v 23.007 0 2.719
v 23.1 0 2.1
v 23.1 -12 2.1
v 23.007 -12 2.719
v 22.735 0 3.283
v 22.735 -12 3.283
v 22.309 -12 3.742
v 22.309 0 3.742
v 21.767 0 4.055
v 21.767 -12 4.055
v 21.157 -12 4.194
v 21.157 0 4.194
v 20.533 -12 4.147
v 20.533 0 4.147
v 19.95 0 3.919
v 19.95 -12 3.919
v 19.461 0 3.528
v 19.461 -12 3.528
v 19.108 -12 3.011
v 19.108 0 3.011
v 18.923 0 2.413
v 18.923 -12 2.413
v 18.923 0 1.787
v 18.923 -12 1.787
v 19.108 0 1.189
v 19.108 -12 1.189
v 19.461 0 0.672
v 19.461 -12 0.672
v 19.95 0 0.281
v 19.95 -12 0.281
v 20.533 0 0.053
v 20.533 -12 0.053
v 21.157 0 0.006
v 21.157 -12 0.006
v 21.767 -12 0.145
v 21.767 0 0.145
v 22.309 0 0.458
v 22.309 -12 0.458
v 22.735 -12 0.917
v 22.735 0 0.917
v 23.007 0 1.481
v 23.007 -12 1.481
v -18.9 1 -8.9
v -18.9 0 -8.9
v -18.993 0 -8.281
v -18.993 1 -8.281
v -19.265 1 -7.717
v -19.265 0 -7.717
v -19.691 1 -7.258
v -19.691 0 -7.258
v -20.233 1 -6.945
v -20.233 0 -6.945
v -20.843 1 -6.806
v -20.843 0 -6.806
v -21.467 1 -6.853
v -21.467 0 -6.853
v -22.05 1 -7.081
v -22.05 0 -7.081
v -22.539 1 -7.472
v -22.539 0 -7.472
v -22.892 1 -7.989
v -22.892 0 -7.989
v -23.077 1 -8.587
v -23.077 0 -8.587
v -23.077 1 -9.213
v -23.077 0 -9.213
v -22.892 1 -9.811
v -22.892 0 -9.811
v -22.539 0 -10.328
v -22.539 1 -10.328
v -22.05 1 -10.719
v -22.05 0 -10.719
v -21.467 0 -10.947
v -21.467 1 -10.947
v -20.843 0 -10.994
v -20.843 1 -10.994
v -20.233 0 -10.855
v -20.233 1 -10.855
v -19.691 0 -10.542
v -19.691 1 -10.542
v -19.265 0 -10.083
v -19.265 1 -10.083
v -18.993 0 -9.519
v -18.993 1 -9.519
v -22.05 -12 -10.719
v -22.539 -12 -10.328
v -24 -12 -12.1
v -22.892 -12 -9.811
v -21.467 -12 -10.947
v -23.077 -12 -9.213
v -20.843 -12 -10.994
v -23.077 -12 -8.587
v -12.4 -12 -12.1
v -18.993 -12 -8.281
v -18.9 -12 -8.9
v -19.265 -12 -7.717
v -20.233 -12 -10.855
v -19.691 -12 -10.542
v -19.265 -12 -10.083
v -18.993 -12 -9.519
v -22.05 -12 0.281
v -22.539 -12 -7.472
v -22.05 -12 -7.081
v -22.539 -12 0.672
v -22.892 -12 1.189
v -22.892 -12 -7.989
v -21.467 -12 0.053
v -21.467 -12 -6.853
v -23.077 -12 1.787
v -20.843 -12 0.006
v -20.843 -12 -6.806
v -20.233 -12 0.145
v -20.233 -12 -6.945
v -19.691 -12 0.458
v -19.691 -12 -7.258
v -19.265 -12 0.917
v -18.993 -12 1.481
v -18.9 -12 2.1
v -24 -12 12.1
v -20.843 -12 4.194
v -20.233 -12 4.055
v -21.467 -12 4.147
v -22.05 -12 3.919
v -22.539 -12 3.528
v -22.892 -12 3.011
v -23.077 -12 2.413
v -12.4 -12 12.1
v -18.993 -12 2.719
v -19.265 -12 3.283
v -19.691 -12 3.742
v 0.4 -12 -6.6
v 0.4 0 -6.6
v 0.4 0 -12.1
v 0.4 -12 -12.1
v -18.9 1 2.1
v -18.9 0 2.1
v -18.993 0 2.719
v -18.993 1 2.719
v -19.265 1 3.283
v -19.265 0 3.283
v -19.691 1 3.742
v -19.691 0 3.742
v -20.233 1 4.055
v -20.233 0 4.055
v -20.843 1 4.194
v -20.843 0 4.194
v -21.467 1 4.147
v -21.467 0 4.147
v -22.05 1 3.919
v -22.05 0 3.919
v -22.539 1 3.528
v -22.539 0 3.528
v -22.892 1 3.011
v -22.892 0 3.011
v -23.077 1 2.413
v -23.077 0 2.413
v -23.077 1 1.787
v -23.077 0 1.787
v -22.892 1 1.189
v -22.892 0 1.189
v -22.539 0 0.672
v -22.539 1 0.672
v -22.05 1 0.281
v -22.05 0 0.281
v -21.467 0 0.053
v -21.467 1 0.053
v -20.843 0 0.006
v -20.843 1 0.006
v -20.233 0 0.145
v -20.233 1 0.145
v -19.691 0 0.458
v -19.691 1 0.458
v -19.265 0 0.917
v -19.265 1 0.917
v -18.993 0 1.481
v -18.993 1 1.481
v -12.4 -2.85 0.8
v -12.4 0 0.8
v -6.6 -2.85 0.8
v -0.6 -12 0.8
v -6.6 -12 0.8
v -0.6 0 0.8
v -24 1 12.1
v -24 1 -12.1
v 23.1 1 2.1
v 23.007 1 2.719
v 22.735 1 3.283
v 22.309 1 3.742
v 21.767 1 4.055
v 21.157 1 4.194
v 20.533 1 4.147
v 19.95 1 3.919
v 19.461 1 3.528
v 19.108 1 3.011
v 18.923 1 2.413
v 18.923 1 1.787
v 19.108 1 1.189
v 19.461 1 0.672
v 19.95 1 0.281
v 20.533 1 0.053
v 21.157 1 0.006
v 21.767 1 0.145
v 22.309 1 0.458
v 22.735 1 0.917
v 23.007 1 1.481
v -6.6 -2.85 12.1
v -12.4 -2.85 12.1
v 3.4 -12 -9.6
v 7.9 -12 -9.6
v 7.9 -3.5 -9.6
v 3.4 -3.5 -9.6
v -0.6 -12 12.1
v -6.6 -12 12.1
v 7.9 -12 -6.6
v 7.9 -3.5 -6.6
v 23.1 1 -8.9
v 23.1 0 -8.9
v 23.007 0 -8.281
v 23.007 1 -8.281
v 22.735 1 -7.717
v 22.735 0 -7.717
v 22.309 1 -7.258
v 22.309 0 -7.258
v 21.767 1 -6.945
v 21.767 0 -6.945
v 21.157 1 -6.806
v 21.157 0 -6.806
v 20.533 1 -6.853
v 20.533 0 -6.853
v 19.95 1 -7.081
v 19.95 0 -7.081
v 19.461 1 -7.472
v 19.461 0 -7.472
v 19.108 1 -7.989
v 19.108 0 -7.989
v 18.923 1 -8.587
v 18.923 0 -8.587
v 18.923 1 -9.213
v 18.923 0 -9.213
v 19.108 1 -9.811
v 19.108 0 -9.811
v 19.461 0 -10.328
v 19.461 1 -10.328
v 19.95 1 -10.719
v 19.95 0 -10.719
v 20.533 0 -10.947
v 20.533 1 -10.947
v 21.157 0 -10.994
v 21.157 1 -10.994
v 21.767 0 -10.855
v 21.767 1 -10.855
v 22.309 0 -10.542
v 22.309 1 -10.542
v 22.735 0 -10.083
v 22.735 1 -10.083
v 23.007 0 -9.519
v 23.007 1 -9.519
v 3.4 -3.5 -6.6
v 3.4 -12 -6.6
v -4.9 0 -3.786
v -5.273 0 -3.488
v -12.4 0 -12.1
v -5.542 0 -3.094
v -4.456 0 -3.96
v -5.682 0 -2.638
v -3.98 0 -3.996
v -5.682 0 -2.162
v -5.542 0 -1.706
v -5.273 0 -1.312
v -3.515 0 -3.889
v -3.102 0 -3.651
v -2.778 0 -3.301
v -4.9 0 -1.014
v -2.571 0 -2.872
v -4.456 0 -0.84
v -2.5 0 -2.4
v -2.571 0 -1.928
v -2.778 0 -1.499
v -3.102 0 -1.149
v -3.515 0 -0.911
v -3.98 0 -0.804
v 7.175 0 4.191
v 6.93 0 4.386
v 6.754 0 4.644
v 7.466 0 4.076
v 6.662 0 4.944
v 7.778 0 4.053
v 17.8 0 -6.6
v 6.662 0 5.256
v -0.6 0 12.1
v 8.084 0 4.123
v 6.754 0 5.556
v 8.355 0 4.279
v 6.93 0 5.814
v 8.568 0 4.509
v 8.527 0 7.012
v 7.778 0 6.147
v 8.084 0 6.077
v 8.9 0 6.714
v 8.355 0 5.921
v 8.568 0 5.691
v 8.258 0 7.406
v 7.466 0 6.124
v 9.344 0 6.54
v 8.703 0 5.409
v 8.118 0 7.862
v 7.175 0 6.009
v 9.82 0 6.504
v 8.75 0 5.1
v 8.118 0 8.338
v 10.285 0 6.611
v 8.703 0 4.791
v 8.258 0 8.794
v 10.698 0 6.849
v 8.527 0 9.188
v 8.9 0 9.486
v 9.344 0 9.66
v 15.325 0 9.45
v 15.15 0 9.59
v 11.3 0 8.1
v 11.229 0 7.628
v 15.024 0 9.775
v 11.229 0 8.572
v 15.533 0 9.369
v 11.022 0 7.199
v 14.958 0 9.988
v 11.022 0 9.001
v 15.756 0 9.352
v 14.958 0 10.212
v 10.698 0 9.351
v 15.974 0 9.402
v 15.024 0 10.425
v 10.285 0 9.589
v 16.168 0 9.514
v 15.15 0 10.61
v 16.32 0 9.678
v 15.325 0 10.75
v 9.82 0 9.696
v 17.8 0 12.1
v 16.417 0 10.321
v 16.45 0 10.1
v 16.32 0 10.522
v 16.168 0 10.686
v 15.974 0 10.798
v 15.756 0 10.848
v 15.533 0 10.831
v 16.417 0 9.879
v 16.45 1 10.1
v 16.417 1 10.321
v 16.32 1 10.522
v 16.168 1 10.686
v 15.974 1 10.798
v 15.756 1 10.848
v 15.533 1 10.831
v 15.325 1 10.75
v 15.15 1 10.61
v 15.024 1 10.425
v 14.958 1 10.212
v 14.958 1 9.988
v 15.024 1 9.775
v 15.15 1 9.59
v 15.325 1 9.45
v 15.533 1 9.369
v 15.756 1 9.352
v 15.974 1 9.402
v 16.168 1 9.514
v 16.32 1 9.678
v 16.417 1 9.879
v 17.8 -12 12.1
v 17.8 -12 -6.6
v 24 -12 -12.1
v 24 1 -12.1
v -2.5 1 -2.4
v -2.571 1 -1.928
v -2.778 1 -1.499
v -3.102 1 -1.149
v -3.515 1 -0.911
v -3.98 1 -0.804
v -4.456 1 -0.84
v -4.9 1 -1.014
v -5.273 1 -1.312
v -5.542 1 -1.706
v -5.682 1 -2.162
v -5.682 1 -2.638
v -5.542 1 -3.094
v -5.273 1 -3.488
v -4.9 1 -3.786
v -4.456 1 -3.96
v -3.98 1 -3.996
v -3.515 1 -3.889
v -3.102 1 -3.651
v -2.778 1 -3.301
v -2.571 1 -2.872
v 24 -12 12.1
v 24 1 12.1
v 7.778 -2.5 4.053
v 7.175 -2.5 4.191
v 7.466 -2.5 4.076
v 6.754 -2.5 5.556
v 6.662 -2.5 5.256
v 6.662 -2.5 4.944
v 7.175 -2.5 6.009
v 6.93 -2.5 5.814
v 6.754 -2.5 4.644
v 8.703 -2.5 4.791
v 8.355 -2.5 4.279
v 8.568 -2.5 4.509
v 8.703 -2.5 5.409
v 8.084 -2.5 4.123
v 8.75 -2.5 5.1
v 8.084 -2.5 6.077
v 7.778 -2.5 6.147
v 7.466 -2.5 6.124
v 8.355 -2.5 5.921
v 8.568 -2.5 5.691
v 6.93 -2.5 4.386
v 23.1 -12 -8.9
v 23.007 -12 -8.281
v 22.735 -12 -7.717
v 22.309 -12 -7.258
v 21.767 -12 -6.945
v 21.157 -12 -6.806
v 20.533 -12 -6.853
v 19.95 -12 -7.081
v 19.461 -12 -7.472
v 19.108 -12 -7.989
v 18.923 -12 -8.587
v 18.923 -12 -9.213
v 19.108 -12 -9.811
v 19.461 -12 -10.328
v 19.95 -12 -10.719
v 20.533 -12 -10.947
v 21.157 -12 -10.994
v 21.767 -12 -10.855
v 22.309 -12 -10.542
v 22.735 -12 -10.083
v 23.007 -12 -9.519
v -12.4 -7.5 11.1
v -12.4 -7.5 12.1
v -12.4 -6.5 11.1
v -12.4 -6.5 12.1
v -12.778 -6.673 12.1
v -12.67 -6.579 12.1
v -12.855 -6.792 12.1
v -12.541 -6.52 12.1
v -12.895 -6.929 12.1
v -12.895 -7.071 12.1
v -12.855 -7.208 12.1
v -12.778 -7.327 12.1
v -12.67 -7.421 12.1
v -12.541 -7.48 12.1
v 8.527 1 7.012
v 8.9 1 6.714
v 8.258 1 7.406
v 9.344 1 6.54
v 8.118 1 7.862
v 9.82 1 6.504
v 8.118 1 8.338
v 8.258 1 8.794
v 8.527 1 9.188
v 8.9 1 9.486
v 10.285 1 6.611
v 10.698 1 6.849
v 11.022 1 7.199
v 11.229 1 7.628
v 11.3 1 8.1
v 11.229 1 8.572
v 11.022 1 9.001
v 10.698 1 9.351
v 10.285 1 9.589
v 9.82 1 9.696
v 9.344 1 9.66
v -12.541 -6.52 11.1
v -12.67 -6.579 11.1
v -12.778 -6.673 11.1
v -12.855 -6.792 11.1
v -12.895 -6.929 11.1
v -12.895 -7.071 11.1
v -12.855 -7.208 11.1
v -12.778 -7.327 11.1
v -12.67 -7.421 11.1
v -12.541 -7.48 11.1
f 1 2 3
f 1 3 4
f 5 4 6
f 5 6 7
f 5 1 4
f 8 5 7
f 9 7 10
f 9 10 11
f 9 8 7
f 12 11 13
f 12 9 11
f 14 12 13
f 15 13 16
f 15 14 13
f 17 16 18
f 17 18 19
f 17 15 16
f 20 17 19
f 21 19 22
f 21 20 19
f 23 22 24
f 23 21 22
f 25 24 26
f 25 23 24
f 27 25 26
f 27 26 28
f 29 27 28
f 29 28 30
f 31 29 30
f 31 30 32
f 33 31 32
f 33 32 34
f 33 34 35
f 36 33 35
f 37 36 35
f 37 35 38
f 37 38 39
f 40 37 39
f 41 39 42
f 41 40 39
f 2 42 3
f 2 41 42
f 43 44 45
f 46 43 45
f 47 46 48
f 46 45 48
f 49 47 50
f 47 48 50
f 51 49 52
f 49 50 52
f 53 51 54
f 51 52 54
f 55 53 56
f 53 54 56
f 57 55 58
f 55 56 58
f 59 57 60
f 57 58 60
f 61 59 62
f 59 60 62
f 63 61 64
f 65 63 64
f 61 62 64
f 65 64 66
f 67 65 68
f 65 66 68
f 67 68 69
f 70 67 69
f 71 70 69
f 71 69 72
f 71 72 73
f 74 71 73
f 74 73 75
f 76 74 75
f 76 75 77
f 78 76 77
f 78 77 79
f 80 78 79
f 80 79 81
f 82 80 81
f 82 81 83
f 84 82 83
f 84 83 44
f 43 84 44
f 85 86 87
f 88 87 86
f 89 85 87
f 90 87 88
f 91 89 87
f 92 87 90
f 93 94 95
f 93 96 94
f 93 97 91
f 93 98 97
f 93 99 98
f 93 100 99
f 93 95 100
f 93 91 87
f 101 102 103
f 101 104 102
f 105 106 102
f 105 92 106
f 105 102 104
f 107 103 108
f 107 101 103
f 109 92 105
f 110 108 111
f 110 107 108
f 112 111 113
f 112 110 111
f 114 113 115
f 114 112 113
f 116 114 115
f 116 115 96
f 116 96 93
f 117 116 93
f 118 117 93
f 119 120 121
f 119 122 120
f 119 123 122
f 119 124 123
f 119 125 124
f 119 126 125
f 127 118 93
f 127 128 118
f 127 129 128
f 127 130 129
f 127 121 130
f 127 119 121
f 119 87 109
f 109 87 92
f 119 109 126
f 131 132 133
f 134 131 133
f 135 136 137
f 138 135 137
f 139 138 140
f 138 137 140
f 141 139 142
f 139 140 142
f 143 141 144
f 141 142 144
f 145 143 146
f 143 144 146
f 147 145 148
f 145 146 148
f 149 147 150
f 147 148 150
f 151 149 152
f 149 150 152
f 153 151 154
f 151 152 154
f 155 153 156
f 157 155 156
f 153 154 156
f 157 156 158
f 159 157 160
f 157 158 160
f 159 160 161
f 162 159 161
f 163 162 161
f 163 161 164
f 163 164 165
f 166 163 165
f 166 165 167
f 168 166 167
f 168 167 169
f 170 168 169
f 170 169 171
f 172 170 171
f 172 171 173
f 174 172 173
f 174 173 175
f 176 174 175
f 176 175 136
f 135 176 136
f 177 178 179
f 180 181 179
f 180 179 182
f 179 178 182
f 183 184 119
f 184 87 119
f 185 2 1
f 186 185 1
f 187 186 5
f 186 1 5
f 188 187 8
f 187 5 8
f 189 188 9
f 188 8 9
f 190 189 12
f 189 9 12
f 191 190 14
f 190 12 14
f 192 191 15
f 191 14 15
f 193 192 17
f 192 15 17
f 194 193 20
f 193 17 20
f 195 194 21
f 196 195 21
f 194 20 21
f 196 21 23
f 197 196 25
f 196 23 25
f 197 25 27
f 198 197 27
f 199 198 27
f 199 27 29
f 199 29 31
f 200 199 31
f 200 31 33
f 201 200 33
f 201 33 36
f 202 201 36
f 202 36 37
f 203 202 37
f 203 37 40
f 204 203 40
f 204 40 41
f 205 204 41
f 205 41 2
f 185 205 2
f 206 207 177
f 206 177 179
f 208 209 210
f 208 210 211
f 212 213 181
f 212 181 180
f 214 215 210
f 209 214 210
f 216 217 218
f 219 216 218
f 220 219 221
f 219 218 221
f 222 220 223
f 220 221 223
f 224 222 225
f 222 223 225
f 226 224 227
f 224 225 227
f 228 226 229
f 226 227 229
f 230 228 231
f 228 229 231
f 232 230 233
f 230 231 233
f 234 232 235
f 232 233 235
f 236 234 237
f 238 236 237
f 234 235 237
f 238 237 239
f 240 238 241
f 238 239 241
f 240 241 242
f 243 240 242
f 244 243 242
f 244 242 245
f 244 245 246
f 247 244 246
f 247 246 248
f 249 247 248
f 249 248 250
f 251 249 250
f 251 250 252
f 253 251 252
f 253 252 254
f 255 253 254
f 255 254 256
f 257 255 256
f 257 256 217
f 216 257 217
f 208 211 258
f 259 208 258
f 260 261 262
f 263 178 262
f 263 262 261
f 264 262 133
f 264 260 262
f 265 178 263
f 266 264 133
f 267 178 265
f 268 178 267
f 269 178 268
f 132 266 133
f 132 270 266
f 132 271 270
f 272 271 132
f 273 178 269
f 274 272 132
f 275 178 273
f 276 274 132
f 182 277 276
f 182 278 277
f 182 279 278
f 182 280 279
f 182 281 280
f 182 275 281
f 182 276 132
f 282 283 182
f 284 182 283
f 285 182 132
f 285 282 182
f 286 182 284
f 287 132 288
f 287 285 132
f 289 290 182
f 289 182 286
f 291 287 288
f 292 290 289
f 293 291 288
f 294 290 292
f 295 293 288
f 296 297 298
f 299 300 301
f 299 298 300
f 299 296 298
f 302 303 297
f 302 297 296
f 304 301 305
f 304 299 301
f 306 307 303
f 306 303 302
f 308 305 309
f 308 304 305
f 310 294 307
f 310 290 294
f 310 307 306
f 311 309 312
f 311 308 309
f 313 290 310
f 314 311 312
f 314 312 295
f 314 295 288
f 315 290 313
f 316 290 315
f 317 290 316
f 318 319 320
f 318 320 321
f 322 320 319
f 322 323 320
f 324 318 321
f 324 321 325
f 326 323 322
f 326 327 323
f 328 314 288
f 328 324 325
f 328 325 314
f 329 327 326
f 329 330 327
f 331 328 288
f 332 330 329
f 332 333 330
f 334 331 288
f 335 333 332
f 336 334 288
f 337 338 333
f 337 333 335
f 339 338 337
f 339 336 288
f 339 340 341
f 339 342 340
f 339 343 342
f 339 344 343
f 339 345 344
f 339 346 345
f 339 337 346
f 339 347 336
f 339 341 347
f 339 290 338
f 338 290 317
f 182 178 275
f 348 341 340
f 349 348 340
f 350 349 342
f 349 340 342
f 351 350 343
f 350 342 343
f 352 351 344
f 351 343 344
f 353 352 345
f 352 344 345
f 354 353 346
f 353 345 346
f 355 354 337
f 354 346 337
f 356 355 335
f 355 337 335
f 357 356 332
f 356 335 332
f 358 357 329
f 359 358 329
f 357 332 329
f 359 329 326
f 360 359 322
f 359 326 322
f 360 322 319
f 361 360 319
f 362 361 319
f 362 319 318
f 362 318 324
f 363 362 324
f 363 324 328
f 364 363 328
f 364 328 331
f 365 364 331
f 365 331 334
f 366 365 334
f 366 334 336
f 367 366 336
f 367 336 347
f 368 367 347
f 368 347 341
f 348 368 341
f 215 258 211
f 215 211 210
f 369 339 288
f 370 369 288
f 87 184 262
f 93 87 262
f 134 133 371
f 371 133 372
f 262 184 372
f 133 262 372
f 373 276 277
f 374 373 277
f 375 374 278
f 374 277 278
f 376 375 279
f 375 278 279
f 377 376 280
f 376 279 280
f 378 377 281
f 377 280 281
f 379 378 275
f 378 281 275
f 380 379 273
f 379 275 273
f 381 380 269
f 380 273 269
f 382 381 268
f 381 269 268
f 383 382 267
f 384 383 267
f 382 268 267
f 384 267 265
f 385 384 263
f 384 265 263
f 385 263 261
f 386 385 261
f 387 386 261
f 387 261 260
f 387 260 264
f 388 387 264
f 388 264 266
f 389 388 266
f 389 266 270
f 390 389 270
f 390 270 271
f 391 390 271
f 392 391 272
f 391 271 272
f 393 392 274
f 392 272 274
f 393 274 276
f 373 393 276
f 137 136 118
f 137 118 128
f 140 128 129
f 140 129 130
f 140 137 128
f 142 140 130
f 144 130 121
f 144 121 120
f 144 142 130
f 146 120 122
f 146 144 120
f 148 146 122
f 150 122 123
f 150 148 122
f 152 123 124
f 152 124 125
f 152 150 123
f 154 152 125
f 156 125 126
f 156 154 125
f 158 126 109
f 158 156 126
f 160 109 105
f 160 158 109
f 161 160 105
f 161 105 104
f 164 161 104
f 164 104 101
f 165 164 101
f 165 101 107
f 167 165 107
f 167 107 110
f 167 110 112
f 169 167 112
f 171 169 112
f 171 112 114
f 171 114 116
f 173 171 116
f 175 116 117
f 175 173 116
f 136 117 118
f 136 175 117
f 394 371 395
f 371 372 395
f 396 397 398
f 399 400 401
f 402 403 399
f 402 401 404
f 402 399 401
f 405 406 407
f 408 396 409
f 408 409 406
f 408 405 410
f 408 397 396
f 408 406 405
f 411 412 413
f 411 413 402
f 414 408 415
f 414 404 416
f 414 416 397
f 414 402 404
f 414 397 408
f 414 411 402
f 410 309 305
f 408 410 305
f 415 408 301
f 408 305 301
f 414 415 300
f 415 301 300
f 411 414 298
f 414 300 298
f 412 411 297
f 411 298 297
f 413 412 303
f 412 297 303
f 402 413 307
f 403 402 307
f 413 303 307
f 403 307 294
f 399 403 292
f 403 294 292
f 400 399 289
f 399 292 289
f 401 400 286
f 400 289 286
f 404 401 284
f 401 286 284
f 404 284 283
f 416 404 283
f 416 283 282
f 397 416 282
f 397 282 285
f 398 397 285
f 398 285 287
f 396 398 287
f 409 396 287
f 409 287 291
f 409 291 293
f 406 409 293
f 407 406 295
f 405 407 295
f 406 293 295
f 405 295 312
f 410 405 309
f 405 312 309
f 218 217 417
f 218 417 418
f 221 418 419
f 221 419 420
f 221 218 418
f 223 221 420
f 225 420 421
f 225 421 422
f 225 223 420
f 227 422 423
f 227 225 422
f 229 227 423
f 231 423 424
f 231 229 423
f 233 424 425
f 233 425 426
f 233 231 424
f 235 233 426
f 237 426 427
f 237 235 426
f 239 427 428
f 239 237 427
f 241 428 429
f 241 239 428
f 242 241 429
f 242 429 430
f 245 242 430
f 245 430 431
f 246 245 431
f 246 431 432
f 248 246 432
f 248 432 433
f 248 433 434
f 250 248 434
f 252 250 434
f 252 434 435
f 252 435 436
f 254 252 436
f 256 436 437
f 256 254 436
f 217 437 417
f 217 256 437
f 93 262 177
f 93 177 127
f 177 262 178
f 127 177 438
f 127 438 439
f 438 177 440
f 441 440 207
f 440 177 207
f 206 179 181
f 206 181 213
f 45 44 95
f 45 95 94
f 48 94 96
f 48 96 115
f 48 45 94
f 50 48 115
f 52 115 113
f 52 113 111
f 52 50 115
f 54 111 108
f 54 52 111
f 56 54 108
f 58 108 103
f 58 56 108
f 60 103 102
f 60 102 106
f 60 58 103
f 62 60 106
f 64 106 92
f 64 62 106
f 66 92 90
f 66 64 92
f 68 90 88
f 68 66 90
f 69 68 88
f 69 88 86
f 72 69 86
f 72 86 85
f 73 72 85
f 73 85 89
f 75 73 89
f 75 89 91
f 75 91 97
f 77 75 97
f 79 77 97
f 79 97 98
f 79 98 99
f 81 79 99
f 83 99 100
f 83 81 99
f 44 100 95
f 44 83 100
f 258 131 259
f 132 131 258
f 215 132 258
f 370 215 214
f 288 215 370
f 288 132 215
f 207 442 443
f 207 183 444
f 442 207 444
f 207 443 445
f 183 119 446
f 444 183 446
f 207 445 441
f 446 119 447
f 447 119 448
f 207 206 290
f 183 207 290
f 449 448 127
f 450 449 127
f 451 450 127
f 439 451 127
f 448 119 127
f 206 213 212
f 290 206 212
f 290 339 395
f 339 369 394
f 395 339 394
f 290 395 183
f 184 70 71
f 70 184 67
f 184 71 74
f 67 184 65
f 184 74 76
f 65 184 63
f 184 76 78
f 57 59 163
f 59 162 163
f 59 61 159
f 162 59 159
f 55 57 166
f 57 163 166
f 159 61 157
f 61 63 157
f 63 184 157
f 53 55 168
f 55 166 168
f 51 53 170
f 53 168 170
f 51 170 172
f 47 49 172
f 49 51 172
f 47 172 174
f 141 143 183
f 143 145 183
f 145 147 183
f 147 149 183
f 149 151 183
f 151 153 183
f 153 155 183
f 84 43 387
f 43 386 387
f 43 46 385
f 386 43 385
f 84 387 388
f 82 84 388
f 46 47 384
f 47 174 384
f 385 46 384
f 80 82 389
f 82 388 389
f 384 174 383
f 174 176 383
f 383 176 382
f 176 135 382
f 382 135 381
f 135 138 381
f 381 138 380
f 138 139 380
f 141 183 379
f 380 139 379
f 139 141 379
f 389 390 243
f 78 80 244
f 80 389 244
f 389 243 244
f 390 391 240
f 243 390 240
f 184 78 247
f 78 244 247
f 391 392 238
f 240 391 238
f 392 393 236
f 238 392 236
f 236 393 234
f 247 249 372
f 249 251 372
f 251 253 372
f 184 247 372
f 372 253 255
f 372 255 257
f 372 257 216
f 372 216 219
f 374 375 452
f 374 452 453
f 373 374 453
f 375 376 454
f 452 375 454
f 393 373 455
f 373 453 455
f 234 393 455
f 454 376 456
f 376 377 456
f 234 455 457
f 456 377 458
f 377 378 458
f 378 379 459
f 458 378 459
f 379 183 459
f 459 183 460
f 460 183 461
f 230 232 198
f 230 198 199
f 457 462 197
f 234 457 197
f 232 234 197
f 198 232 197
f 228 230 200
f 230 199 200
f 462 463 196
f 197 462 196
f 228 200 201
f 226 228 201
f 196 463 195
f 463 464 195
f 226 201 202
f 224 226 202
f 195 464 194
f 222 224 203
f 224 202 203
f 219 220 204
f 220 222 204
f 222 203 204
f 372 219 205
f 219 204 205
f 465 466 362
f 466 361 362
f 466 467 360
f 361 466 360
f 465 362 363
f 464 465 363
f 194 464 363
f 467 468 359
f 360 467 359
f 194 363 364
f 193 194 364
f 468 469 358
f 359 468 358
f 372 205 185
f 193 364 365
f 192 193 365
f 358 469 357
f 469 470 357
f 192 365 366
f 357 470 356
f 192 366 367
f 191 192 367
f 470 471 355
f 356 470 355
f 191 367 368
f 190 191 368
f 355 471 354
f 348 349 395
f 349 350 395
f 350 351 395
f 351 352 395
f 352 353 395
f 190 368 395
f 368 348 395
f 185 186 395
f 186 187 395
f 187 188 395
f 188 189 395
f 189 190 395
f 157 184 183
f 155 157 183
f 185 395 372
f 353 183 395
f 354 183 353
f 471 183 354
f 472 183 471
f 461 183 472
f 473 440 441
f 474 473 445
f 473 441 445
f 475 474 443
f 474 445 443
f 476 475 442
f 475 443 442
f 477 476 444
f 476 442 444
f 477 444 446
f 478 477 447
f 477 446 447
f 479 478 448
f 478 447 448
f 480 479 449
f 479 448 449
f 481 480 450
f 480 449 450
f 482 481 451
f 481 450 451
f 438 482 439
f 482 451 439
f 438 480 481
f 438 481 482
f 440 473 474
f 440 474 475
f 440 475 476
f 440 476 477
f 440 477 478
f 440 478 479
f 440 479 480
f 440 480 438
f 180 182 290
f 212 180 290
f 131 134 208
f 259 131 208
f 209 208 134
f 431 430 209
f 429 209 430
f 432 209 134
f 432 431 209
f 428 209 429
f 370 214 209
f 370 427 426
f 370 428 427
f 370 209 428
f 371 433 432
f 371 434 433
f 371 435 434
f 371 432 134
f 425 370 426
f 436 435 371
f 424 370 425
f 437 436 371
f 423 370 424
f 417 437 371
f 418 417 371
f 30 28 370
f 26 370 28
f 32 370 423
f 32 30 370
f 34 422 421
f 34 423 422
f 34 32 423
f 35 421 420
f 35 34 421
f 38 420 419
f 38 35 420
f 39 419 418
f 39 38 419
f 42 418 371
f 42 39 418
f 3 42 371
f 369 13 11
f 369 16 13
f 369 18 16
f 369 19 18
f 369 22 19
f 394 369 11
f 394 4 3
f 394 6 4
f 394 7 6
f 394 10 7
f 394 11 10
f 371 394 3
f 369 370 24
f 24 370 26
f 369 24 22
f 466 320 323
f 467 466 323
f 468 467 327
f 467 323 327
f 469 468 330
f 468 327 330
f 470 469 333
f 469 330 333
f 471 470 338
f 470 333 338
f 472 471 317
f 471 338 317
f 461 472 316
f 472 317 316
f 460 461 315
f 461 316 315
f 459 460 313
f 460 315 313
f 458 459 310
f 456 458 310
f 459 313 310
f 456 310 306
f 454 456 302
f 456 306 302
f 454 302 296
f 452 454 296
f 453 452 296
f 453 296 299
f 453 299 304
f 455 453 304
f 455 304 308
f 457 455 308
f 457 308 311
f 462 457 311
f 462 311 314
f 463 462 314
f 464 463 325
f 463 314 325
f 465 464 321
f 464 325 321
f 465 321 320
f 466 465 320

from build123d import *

# Parameters (mm, degrees)
F0_W          = 48
F0_H          = 24.2
F0_R          = 1.6
F1_DEPTH      = 1
F2_R          = 2.1
F2_W          = 6
F2_H          = 11.3
F3_DEPTH      = 12
F2_W_2        = 4.5
F2_H_2        = 3
F4_DEPTH      = 3.5
F2_R_2        = 1.05
F5_DEPTH      = 2.5
F2_R_3        = 0.75
F6_DEPTH      = 1.001
F7_DEPTH      = 12.001
F7_DEPTH_BACK = 1.001
F2_W_3        = 5.8
F8_DEPTH      = 2.85
F9_R          = 0.5
F10_DEPTH     = 1


with BuildPart() as f1:
    # F0 (on Front) → F1 (new body)
    with BuildSketch(Plane.XZ):
        Rectangle(F0_W, F0_H)
        with Locations((-4.1, -2.4)):
            Circle(F0_R, mode=Mode.SUBTRACT)
        with Locations((9.7, 8.1)):
            Circle(F0_R, mode=Mode.SUBTRACT)
    extrude(amount=-F1_DEPTH)

    # F2 (on face) → F3 (join)
    with BuildSketch(Plane.XZ):
        Polygon((3.4, -6.6), (0.4, -6.6), (0.4, -12.1), (17.8, -12.1), (17.8, -6.6), (7.9, -6.6), (7.9, -9.6), (3.4, -9.6), align=None)
        Polygon((-24, -12.1), (-12.4, -12.1), (-12.4, 0.8), (-12.4, 12.1), (-24, 12.1), align=None)
        with Locations((-21, -8.9)):
            Circle(F2_R, mode=Mode.SUBTRACT)
        with Locations((-21, 2.1)):
            Circle(F2_R, mode=Mode.SUBTRACT)
        Polygon((17.8, -6.6), (17.8, -12.1), (24, -12.1), (24, 12.1), (17.8, 12.1), align=None)
        with Locations((21, -8.9)):
            Circle(F2_R, mode=Mode.SUBTRACT)
        with Locations((21, 2.1)):
            Circle(F2_R, mode=Mode.SUBTRACT)
        with Locations((-3.6, 6.45)):
            Rectangle(F2_W, F2_H)
    extrude(amount=F3_DEPTH)

    # F2 (on face) → F4 (join)
    with BuildSketch(Plane.XZ):
        with Locations((5.65, -8.1)):
            Rectangle(F2_W_2, F2_H_2)
    extrude(amount=F4_DEPTH)

    # F2 (on face) → F5 (join)
    with BuildSketch(Plane.XZ):
        with Locations((7.7, 5.1)):
            Circle(F2_R_2)
    extrude(amount=F5_DEPTH)

    # F2 (on face) → F6 (cut, through all)
    with BuildSketch(Plane.XZ):
        with Locations((15.7, 10.1)):
            Circle(F2_R_3)
    extrude(amount=-F6_DEPTH, mode=Mode.SUBTRACT)

    # F2 (on face) → F7 (cut, two sides)
    with BuildSketch(Plane.XZ) as f7_sk:
        with Locations((-21, 2.1)):
            Circle(F2_R)
        with Locations((21, 2.1)):
            Circle(F2_R)
        with Locations((-21, -8.9)):
            Circle(F2_R)
        with Locations((21, -8.9)):
            Circle(F2_R)
    extrude(amount=F7_DEPTH, mode=Mode.SUBTRACT)
    extrude(f7_sk.sketch, amount=-F7_DEPTH_BACK, mode=Mode.SUBTRACT)

    # F2 (on face) → F8 (join)
    with BuildSketch(Plane.XZ):
        with Locations((-9.5, 6.45)):
            Rectangle(F2_W_3, F2_H)
    extrude(amount=F8_DEPTH)

    # F9 (on face) → F10 (cut)
    with BuildSketch(Plane.XY.offset(12.1)):
        with Locations((-12.4, -7)):
            Circle(F9_R)
    extrude(amount=-F10_DEPTH, mode=Mode.SUBTRACT)


solid = f1.part
